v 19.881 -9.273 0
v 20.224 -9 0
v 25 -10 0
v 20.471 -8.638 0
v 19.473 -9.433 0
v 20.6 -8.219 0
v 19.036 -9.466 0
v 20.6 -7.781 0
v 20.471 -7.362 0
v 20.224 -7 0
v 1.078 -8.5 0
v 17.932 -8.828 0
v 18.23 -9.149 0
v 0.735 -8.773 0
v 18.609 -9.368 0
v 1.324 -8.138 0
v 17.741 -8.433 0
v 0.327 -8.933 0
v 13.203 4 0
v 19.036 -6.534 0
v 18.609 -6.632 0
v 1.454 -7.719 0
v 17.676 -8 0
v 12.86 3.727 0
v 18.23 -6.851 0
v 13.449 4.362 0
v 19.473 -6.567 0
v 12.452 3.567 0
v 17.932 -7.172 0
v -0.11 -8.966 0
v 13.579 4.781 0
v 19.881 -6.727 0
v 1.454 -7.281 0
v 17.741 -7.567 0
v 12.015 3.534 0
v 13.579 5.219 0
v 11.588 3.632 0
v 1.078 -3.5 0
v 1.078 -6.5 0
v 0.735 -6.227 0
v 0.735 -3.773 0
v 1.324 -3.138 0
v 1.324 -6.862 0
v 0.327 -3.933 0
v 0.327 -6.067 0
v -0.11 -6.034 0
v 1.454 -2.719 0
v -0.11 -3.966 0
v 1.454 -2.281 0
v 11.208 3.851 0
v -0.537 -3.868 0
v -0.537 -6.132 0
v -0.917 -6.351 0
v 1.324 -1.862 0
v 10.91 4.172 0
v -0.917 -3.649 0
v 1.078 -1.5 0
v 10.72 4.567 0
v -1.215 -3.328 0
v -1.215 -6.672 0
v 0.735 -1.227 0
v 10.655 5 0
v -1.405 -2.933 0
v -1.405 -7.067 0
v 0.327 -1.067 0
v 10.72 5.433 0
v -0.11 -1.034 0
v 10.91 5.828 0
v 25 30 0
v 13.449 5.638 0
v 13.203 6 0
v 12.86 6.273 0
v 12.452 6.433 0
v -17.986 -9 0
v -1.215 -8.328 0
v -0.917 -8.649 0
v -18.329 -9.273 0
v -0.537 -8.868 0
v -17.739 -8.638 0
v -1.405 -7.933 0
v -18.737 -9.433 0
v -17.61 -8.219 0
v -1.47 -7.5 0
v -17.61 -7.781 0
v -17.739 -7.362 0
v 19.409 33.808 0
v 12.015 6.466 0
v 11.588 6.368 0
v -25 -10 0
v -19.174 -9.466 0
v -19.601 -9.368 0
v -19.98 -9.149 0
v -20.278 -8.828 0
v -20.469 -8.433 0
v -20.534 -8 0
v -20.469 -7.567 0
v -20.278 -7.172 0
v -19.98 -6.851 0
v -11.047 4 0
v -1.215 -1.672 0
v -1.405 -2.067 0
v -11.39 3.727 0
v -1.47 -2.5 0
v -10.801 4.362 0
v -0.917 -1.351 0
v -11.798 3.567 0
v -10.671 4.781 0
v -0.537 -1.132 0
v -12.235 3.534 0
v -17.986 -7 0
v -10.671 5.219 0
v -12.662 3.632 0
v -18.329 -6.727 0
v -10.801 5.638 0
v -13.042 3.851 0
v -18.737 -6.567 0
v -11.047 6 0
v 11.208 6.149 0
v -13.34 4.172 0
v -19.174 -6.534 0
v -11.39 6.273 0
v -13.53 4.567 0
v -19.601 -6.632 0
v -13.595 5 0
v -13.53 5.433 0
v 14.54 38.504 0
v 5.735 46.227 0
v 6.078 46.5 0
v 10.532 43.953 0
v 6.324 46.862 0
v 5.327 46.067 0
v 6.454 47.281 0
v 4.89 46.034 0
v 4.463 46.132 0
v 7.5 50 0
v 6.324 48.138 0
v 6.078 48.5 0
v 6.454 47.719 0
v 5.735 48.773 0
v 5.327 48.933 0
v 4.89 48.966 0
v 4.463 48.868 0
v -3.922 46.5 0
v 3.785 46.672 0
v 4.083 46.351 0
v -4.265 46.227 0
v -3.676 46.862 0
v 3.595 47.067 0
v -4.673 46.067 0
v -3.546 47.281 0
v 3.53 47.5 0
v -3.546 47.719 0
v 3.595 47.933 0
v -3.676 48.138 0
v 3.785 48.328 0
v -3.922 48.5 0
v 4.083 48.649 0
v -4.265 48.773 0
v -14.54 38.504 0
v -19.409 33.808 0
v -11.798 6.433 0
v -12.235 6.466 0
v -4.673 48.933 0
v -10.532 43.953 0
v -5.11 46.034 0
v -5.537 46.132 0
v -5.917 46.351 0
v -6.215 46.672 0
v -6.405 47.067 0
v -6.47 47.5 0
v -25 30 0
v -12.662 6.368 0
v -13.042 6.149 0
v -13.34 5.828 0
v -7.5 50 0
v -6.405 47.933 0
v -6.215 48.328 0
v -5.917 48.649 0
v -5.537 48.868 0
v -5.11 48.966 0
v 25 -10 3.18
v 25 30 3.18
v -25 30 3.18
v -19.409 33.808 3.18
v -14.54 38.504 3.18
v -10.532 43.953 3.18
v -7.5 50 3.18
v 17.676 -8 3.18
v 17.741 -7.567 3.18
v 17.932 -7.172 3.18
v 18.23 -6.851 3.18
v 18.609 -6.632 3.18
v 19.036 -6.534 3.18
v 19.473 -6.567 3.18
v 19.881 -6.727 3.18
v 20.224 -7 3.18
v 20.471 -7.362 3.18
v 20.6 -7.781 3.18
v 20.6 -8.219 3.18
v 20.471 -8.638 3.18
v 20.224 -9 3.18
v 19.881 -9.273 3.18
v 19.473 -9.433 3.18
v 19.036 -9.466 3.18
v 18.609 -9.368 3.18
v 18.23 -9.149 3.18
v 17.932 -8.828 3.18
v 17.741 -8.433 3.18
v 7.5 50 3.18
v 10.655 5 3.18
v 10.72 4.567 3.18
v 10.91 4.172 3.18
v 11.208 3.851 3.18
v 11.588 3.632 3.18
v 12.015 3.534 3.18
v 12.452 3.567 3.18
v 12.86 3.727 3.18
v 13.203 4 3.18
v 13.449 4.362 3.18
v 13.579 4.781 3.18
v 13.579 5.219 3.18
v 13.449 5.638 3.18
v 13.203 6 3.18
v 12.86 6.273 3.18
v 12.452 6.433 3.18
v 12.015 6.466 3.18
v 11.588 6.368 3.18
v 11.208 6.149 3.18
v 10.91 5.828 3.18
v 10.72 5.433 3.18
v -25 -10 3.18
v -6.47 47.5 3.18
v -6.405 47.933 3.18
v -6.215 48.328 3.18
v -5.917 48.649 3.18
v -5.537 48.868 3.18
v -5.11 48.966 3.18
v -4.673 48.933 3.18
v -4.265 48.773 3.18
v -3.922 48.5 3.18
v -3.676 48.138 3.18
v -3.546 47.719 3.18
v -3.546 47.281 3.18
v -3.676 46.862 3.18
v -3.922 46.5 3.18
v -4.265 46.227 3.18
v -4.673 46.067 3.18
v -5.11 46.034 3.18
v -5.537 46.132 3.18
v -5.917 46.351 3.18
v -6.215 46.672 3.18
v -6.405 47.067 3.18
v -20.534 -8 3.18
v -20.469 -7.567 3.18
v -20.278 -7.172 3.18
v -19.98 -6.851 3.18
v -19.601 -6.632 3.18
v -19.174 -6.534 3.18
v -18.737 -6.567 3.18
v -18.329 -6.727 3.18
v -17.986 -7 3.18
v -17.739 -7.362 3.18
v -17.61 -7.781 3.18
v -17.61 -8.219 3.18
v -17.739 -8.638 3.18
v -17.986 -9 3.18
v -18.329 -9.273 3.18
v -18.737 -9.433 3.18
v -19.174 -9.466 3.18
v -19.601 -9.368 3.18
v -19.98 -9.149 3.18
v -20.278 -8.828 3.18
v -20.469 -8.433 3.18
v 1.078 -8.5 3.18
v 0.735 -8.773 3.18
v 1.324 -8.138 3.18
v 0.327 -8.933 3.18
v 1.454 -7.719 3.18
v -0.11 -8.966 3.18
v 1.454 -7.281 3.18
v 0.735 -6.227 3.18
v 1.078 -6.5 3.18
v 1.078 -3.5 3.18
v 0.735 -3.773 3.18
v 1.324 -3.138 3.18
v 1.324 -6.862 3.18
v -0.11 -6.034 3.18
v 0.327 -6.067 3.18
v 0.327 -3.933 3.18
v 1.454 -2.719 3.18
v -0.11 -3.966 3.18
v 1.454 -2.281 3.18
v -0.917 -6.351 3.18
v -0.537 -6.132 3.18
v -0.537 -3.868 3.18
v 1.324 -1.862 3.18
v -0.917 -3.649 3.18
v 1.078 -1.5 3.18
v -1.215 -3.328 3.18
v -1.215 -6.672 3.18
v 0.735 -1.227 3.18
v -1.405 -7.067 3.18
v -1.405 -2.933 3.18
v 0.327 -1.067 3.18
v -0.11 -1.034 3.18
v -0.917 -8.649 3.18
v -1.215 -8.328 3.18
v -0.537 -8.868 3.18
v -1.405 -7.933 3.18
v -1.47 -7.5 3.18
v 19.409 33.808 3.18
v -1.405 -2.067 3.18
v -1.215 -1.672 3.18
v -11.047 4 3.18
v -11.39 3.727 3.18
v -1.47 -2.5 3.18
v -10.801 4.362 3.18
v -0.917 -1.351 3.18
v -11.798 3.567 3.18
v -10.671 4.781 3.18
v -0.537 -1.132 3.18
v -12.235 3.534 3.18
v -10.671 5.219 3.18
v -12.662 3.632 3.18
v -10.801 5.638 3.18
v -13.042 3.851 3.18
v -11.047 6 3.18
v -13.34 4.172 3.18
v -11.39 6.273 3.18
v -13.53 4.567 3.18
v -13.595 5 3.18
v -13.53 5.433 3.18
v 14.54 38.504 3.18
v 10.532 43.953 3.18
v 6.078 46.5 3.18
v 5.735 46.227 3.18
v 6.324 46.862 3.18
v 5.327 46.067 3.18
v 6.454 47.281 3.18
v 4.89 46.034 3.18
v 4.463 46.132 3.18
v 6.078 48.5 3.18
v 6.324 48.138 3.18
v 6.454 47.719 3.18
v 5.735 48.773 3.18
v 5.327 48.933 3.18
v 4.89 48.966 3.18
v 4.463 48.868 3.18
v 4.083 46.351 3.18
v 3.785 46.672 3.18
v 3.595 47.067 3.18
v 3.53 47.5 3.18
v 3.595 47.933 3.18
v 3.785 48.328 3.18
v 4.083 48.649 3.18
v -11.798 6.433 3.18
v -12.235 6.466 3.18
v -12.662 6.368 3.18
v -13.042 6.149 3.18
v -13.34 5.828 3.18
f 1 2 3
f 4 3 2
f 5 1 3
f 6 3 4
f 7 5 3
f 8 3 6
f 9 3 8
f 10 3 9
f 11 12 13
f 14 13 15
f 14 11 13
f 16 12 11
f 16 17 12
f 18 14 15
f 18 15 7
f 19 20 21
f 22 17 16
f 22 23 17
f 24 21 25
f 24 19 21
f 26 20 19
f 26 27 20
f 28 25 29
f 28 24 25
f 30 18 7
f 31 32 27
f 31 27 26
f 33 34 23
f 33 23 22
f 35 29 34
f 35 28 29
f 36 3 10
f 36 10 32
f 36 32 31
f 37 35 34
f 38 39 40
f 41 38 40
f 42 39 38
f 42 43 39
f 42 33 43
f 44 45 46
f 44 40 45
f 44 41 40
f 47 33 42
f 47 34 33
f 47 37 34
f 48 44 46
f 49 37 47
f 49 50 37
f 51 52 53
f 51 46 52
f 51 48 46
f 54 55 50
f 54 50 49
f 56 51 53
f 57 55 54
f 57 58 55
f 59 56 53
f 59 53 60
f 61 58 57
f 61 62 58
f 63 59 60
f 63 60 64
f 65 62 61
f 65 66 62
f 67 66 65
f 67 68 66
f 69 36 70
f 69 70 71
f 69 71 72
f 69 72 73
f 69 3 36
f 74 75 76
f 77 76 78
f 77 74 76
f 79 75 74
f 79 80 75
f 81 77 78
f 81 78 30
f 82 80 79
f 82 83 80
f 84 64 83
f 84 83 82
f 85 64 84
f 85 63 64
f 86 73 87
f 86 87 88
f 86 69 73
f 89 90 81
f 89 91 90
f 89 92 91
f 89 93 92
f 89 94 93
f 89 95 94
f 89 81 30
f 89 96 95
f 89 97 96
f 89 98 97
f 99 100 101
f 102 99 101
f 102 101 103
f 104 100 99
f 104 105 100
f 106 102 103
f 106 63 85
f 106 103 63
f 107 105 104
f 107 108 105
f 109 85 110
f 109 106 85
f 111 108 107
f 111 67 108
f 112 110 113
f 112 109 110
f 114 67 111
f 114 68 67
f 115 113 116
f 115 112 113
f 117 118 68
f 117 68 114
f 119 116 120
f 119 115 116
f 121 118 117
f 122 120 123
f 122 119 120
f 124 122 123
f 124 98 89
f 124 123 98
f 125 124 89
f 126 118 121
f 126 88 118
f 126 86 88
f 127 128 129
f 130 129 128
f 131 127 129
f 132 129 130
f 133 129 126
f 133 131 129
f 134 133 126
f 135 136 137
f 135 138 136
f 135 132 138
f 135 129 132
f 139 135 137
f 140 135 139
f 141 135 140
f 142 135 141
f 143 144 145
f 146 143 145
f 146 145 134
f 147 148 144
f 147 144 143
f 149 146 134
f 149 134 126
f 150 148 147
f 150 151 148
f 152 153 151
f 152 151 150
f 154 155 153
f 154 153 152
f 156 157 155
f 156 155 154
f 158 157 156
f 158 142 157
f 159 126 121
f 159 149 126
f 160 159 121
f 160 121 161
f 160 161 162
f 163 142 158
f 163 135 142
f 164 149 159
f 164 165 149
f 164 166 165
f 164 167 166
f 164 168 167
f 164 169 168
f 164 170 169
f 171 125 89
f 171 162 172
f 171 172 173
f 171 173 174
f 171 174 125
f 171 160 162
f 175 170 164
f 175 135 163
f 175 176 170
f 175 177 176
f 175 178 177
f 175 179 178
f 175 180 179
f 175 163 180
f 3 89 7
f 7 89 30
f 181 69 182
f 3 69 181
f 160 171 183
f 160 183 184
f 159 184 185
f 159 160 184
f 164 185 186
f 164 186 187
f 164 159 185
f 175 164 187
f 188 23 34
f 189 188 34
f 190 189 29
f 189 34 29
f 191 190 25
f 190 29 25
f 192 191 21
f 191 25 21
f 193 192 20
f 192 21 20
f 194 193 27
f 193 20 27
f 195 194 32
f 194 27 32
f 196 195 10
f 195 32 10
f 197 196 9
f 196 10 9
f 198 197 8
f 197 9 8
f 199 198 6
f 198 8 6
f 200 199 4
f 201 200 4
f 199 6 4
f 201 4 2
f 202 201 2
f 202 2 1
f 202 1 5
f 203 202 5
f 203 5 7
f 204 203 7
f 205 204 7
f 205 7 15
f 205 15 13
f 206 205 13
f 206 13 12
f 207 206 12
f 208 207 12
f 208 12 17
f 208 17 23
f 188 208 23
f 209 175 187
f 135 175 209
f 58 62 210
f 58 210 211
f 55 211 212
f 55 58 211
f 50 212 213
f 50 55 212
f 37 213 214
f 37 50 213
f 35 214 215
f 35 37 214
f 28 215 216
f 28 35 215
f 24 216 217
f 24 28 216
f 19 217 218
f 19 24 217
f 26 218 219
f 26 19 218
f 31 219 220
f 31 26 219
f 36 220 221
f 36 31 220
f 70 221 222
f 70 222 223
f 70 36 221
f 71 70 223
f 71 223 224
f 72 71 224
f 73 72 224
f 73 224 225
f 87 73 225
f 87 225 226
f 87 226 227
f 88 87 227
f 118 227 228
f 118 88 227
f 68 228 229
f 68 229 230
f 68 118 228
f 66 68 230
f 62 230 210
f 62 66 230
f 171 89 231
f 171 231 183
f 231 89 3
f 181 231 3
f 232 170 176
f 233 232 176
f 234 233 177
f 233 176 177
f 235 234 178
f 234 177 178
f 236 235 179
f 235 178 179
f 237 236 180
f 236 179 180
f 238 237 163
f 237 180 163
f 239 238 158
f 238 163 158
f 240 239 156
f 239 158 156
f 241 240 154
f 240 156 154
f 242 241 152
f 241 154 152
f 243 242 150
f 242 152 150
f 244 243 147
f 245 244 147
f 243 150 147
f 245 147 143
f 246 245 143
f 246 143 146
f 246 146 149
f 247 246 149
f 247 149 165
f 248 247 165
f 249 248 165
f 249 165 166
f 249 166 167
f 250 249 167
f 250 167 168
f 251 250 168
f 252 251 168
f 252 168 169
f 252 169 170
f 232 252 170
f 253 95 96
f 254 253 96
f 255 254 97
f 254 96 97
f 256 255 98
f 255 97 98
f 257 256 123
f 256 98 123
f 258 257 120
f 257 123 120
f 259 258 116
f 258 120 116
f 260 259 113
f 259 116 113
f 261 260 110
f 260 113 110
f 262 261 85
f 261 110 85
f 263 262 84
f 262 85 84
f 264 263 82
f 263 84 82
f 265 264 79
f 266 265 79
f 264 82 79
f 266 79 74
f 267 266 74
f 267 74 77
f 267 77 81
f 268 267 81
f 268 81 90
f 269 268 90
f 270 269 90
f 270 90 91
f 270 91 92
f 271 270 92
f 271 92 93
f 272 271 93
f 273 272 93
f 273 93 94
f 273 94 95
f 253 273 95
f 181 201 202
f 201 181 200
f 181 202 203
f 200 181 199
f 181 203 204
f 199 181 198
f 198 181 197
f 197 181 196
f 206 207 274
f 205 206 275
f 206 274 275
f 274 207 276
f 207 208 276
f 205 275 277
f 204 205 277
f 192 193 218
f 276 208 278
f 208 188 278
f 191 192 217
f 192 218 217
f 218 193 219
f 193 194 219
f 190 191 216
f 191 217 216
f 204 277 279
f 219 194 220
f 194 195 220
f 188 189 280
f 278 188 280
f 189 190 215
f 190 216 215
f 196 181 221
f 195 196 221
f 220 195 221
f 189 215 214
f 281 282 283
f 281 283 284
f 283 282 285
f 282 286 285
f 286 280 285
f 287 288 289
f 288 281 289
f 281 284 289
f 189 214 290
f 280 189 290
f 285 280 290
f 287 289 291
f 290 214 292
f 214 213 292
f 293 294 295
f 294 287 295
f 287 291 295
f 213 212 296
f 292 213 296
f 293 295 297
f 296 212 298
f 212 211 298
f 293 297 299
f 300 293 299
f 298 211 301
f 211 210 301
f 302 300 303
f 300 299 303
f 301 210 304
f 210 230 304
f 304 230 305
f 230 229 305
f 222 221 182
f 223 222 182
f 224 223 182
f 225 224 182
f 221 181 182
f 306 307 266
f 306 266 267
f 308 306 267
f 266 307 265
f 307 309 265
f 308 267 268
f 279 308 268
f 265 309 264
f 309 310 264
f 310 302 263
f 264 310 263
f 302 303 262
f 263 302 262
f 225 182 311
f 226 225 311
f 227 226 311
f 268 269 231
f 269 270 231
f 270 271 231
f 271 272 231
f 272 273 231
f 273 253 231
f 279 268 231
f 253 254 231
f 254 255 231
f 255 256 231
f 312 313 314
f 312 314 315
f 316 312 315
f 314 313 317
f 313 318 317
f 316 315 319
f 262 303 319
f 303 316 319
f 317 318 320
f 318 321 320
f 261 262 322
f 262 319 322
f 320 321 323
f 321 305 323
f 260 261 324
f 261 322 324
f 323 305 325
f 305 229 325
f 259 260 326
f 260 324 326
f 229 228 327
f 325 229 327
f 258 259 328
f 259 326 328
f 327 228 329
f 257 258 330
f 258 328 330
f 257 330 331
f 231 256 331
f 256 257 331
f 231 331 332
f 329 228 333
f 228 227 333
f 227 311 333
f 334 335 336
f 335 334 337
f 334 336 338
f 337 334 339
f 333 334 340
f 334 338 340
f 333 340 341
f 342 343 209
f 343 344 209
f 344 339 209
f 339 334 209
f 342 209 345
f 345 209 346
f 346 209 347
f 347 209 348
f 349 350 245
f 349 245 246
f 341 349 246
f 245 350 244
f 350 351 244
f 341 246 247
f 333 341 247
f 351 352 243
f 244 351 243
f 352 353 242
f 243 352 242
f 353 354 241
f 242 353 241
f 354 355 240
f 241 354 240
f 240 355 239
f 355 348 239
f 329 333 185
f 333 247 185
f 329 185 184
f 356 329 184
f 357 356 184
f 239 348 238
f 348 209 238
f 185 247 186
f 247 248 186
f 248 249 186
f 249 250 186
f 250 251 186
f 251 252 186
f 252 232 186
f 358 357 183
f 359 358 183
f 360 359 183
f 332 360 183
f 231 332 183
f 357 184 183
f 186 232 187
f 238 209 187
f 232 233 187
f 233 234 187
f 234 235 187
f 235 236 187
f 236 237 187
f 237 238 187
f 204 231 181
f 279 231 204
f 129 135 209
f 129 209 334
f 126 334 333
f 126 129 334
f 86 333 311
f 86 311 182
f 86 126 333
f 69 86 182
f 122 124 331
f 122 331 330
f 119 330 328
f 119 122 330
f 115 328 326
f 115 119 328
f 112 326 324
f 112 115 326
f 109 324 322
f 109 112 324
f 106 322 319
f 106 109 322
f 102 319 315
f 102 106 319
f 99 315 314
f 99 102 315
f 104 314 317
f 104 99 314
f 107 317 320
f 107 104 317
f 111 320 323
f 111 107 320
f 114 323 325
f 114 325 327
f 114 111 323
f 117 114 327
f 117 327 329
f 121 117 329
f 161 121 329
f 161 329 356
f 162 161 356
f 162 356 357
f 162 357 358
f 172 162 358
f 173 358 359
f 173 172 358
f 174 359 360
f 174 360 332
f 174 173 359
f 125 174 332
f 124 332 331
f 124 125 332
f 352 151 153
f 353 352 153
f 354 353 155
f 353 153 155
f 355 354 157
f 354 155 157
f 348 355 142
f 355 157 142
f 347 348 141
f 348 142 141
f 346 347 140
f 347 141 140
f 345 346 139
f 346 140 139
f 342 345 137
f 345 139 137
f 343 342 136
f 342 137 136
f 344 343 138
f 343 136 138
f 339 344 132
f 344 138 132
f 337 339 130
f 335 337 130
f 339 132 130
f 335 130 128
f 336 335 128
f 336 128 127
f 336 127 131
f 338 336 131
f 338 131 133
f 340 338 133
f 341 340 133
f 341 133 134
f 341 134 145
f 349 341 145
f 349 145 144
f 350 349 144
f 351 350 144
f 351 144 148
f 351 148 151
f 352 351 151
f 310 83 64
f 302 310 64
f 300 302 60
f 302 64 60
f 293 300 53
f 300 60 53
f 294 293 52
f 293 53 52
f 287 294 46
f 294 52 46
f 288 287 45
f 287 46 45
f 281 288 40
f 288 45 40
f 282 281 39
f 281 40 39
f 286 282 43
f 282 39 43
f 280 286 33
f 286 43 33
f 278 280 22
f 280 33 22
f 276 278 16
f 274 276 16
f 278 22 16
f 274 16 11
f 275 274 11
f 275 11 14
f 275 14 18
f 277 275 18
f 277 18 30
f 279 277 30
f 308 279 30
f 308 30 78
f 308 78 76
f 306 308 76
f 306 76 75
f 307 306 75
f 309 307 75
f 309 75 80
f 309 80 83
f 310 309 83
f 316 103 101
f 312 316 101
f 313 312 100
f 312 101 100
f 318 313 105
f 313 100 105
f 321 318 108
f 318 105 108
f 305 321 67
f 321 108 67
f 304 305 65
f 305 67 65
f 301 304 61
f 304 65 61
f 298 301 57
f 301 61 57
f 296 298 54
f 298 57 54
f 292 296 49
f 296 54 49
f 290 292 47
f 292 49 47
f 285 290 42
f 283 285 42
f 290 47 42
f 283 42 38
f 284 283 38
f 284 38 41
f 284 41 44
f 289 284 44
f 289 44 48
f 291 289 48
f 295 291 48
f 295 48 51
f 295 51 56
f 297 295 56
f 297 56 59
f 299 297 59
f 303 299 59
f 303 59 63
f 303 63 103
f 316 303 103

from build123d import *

# Parameters (mm, degrees)
SKETCH1_W           = 50
SKETCH1_H           = 30
SKETCH1_R           = 1.47
BOSS_EXTRUDE1_DEPTH = 3.18
BOSS_EXTRUDE2_DEPTH = 3.18
SKETCH3_R           = 1.47
CUT_EXTRUDE1_DEPTH  = 56.992074439
SKETCH4_R           = 1.47
CUT_EXTRUDE2_DEPTH  = 56.992074439


with BuildPart() as part:
    # Sketch1 → Boss-Extrude1 (new body)
    with BuildSketch(Plane.XY):
        with Locations((0, 5)):
            Rectangle(SKETCH1_W, SKETCH1_H)
        with Locations(Location((-12.125, 5, 0), (0, 0, 180))):
            Circle(SKETCH1_R, mode=Mode.SUBTRACT)
        with Locations(Location((12.125, 5, 0), (0, 0, 180))):
            Circle(SKETCH1_R, mode=Mode.SUBTRACT)
    extrude(amount=BOSS_EXTRUDE1_DEPTH)

    # Sketch2 → Boss-Extrude2 (add)
    with BuildSketch(Plane(origin=(0, 0, 0), x_dir=(-1, 0, 0), z_dir=(0, 0, -1))):
        with BuildLine():
            Line((-25, 20), (25, 20))
            Line((25, 20), (25, 30))
            ThreePointArc((25, 30), (14.540499974, 38.504187477), (7.5, 50))
            Line((7.5, 50), (-7.5, 50))
            ThreePointArc((-7.5, 50), (-14.540499974, 38.504187477), (-25, 30))
            Line((-25, 30), (-25, 20))
        make_face()
    extrude(amount=-BOSS_EXTRUDE2_DEPTH)

    # Sketch3 → Cut-Extrude1 (cut, through all)
    with BuildSketch(Plane(origin=(0, 0, 0), x_dir=(-1, 0, 0), z_dir=(0, 0, -1))):
        with Locations((-5, 47.5)):
            Circle(SKETCH3_R)
        with Locations((5, 47.5)):
            Circle(SKETCH3_R)
    extrude(amount=-CUT_EXTRUDE1_DEPTH, mode=Mode.SUBTRACT)

    # Sketch4 → Cut-Extrude2 (cut, through all)
    with BuildSketch(Plane(origin=(0, 0, 0), x_dir=(-1, 0, 0), z_dir=(0, 0, -1))):
        with Locations((0, -7.5)):
            Circle(SKETCH4_R)
        with Locations((-19.1461, -8)):
            Circle(SKETCH4_R)
        with Locations((0, -2.5)):
            Circle(SKETCH4_R)
        with Locations((19.0639, -8)):
            Circle(SKETCH4_R)
    extrude(amount=-CUT_EXTRUDE2_DEPTH, mode=Mode.SUBTRACT)


solid = part.part
